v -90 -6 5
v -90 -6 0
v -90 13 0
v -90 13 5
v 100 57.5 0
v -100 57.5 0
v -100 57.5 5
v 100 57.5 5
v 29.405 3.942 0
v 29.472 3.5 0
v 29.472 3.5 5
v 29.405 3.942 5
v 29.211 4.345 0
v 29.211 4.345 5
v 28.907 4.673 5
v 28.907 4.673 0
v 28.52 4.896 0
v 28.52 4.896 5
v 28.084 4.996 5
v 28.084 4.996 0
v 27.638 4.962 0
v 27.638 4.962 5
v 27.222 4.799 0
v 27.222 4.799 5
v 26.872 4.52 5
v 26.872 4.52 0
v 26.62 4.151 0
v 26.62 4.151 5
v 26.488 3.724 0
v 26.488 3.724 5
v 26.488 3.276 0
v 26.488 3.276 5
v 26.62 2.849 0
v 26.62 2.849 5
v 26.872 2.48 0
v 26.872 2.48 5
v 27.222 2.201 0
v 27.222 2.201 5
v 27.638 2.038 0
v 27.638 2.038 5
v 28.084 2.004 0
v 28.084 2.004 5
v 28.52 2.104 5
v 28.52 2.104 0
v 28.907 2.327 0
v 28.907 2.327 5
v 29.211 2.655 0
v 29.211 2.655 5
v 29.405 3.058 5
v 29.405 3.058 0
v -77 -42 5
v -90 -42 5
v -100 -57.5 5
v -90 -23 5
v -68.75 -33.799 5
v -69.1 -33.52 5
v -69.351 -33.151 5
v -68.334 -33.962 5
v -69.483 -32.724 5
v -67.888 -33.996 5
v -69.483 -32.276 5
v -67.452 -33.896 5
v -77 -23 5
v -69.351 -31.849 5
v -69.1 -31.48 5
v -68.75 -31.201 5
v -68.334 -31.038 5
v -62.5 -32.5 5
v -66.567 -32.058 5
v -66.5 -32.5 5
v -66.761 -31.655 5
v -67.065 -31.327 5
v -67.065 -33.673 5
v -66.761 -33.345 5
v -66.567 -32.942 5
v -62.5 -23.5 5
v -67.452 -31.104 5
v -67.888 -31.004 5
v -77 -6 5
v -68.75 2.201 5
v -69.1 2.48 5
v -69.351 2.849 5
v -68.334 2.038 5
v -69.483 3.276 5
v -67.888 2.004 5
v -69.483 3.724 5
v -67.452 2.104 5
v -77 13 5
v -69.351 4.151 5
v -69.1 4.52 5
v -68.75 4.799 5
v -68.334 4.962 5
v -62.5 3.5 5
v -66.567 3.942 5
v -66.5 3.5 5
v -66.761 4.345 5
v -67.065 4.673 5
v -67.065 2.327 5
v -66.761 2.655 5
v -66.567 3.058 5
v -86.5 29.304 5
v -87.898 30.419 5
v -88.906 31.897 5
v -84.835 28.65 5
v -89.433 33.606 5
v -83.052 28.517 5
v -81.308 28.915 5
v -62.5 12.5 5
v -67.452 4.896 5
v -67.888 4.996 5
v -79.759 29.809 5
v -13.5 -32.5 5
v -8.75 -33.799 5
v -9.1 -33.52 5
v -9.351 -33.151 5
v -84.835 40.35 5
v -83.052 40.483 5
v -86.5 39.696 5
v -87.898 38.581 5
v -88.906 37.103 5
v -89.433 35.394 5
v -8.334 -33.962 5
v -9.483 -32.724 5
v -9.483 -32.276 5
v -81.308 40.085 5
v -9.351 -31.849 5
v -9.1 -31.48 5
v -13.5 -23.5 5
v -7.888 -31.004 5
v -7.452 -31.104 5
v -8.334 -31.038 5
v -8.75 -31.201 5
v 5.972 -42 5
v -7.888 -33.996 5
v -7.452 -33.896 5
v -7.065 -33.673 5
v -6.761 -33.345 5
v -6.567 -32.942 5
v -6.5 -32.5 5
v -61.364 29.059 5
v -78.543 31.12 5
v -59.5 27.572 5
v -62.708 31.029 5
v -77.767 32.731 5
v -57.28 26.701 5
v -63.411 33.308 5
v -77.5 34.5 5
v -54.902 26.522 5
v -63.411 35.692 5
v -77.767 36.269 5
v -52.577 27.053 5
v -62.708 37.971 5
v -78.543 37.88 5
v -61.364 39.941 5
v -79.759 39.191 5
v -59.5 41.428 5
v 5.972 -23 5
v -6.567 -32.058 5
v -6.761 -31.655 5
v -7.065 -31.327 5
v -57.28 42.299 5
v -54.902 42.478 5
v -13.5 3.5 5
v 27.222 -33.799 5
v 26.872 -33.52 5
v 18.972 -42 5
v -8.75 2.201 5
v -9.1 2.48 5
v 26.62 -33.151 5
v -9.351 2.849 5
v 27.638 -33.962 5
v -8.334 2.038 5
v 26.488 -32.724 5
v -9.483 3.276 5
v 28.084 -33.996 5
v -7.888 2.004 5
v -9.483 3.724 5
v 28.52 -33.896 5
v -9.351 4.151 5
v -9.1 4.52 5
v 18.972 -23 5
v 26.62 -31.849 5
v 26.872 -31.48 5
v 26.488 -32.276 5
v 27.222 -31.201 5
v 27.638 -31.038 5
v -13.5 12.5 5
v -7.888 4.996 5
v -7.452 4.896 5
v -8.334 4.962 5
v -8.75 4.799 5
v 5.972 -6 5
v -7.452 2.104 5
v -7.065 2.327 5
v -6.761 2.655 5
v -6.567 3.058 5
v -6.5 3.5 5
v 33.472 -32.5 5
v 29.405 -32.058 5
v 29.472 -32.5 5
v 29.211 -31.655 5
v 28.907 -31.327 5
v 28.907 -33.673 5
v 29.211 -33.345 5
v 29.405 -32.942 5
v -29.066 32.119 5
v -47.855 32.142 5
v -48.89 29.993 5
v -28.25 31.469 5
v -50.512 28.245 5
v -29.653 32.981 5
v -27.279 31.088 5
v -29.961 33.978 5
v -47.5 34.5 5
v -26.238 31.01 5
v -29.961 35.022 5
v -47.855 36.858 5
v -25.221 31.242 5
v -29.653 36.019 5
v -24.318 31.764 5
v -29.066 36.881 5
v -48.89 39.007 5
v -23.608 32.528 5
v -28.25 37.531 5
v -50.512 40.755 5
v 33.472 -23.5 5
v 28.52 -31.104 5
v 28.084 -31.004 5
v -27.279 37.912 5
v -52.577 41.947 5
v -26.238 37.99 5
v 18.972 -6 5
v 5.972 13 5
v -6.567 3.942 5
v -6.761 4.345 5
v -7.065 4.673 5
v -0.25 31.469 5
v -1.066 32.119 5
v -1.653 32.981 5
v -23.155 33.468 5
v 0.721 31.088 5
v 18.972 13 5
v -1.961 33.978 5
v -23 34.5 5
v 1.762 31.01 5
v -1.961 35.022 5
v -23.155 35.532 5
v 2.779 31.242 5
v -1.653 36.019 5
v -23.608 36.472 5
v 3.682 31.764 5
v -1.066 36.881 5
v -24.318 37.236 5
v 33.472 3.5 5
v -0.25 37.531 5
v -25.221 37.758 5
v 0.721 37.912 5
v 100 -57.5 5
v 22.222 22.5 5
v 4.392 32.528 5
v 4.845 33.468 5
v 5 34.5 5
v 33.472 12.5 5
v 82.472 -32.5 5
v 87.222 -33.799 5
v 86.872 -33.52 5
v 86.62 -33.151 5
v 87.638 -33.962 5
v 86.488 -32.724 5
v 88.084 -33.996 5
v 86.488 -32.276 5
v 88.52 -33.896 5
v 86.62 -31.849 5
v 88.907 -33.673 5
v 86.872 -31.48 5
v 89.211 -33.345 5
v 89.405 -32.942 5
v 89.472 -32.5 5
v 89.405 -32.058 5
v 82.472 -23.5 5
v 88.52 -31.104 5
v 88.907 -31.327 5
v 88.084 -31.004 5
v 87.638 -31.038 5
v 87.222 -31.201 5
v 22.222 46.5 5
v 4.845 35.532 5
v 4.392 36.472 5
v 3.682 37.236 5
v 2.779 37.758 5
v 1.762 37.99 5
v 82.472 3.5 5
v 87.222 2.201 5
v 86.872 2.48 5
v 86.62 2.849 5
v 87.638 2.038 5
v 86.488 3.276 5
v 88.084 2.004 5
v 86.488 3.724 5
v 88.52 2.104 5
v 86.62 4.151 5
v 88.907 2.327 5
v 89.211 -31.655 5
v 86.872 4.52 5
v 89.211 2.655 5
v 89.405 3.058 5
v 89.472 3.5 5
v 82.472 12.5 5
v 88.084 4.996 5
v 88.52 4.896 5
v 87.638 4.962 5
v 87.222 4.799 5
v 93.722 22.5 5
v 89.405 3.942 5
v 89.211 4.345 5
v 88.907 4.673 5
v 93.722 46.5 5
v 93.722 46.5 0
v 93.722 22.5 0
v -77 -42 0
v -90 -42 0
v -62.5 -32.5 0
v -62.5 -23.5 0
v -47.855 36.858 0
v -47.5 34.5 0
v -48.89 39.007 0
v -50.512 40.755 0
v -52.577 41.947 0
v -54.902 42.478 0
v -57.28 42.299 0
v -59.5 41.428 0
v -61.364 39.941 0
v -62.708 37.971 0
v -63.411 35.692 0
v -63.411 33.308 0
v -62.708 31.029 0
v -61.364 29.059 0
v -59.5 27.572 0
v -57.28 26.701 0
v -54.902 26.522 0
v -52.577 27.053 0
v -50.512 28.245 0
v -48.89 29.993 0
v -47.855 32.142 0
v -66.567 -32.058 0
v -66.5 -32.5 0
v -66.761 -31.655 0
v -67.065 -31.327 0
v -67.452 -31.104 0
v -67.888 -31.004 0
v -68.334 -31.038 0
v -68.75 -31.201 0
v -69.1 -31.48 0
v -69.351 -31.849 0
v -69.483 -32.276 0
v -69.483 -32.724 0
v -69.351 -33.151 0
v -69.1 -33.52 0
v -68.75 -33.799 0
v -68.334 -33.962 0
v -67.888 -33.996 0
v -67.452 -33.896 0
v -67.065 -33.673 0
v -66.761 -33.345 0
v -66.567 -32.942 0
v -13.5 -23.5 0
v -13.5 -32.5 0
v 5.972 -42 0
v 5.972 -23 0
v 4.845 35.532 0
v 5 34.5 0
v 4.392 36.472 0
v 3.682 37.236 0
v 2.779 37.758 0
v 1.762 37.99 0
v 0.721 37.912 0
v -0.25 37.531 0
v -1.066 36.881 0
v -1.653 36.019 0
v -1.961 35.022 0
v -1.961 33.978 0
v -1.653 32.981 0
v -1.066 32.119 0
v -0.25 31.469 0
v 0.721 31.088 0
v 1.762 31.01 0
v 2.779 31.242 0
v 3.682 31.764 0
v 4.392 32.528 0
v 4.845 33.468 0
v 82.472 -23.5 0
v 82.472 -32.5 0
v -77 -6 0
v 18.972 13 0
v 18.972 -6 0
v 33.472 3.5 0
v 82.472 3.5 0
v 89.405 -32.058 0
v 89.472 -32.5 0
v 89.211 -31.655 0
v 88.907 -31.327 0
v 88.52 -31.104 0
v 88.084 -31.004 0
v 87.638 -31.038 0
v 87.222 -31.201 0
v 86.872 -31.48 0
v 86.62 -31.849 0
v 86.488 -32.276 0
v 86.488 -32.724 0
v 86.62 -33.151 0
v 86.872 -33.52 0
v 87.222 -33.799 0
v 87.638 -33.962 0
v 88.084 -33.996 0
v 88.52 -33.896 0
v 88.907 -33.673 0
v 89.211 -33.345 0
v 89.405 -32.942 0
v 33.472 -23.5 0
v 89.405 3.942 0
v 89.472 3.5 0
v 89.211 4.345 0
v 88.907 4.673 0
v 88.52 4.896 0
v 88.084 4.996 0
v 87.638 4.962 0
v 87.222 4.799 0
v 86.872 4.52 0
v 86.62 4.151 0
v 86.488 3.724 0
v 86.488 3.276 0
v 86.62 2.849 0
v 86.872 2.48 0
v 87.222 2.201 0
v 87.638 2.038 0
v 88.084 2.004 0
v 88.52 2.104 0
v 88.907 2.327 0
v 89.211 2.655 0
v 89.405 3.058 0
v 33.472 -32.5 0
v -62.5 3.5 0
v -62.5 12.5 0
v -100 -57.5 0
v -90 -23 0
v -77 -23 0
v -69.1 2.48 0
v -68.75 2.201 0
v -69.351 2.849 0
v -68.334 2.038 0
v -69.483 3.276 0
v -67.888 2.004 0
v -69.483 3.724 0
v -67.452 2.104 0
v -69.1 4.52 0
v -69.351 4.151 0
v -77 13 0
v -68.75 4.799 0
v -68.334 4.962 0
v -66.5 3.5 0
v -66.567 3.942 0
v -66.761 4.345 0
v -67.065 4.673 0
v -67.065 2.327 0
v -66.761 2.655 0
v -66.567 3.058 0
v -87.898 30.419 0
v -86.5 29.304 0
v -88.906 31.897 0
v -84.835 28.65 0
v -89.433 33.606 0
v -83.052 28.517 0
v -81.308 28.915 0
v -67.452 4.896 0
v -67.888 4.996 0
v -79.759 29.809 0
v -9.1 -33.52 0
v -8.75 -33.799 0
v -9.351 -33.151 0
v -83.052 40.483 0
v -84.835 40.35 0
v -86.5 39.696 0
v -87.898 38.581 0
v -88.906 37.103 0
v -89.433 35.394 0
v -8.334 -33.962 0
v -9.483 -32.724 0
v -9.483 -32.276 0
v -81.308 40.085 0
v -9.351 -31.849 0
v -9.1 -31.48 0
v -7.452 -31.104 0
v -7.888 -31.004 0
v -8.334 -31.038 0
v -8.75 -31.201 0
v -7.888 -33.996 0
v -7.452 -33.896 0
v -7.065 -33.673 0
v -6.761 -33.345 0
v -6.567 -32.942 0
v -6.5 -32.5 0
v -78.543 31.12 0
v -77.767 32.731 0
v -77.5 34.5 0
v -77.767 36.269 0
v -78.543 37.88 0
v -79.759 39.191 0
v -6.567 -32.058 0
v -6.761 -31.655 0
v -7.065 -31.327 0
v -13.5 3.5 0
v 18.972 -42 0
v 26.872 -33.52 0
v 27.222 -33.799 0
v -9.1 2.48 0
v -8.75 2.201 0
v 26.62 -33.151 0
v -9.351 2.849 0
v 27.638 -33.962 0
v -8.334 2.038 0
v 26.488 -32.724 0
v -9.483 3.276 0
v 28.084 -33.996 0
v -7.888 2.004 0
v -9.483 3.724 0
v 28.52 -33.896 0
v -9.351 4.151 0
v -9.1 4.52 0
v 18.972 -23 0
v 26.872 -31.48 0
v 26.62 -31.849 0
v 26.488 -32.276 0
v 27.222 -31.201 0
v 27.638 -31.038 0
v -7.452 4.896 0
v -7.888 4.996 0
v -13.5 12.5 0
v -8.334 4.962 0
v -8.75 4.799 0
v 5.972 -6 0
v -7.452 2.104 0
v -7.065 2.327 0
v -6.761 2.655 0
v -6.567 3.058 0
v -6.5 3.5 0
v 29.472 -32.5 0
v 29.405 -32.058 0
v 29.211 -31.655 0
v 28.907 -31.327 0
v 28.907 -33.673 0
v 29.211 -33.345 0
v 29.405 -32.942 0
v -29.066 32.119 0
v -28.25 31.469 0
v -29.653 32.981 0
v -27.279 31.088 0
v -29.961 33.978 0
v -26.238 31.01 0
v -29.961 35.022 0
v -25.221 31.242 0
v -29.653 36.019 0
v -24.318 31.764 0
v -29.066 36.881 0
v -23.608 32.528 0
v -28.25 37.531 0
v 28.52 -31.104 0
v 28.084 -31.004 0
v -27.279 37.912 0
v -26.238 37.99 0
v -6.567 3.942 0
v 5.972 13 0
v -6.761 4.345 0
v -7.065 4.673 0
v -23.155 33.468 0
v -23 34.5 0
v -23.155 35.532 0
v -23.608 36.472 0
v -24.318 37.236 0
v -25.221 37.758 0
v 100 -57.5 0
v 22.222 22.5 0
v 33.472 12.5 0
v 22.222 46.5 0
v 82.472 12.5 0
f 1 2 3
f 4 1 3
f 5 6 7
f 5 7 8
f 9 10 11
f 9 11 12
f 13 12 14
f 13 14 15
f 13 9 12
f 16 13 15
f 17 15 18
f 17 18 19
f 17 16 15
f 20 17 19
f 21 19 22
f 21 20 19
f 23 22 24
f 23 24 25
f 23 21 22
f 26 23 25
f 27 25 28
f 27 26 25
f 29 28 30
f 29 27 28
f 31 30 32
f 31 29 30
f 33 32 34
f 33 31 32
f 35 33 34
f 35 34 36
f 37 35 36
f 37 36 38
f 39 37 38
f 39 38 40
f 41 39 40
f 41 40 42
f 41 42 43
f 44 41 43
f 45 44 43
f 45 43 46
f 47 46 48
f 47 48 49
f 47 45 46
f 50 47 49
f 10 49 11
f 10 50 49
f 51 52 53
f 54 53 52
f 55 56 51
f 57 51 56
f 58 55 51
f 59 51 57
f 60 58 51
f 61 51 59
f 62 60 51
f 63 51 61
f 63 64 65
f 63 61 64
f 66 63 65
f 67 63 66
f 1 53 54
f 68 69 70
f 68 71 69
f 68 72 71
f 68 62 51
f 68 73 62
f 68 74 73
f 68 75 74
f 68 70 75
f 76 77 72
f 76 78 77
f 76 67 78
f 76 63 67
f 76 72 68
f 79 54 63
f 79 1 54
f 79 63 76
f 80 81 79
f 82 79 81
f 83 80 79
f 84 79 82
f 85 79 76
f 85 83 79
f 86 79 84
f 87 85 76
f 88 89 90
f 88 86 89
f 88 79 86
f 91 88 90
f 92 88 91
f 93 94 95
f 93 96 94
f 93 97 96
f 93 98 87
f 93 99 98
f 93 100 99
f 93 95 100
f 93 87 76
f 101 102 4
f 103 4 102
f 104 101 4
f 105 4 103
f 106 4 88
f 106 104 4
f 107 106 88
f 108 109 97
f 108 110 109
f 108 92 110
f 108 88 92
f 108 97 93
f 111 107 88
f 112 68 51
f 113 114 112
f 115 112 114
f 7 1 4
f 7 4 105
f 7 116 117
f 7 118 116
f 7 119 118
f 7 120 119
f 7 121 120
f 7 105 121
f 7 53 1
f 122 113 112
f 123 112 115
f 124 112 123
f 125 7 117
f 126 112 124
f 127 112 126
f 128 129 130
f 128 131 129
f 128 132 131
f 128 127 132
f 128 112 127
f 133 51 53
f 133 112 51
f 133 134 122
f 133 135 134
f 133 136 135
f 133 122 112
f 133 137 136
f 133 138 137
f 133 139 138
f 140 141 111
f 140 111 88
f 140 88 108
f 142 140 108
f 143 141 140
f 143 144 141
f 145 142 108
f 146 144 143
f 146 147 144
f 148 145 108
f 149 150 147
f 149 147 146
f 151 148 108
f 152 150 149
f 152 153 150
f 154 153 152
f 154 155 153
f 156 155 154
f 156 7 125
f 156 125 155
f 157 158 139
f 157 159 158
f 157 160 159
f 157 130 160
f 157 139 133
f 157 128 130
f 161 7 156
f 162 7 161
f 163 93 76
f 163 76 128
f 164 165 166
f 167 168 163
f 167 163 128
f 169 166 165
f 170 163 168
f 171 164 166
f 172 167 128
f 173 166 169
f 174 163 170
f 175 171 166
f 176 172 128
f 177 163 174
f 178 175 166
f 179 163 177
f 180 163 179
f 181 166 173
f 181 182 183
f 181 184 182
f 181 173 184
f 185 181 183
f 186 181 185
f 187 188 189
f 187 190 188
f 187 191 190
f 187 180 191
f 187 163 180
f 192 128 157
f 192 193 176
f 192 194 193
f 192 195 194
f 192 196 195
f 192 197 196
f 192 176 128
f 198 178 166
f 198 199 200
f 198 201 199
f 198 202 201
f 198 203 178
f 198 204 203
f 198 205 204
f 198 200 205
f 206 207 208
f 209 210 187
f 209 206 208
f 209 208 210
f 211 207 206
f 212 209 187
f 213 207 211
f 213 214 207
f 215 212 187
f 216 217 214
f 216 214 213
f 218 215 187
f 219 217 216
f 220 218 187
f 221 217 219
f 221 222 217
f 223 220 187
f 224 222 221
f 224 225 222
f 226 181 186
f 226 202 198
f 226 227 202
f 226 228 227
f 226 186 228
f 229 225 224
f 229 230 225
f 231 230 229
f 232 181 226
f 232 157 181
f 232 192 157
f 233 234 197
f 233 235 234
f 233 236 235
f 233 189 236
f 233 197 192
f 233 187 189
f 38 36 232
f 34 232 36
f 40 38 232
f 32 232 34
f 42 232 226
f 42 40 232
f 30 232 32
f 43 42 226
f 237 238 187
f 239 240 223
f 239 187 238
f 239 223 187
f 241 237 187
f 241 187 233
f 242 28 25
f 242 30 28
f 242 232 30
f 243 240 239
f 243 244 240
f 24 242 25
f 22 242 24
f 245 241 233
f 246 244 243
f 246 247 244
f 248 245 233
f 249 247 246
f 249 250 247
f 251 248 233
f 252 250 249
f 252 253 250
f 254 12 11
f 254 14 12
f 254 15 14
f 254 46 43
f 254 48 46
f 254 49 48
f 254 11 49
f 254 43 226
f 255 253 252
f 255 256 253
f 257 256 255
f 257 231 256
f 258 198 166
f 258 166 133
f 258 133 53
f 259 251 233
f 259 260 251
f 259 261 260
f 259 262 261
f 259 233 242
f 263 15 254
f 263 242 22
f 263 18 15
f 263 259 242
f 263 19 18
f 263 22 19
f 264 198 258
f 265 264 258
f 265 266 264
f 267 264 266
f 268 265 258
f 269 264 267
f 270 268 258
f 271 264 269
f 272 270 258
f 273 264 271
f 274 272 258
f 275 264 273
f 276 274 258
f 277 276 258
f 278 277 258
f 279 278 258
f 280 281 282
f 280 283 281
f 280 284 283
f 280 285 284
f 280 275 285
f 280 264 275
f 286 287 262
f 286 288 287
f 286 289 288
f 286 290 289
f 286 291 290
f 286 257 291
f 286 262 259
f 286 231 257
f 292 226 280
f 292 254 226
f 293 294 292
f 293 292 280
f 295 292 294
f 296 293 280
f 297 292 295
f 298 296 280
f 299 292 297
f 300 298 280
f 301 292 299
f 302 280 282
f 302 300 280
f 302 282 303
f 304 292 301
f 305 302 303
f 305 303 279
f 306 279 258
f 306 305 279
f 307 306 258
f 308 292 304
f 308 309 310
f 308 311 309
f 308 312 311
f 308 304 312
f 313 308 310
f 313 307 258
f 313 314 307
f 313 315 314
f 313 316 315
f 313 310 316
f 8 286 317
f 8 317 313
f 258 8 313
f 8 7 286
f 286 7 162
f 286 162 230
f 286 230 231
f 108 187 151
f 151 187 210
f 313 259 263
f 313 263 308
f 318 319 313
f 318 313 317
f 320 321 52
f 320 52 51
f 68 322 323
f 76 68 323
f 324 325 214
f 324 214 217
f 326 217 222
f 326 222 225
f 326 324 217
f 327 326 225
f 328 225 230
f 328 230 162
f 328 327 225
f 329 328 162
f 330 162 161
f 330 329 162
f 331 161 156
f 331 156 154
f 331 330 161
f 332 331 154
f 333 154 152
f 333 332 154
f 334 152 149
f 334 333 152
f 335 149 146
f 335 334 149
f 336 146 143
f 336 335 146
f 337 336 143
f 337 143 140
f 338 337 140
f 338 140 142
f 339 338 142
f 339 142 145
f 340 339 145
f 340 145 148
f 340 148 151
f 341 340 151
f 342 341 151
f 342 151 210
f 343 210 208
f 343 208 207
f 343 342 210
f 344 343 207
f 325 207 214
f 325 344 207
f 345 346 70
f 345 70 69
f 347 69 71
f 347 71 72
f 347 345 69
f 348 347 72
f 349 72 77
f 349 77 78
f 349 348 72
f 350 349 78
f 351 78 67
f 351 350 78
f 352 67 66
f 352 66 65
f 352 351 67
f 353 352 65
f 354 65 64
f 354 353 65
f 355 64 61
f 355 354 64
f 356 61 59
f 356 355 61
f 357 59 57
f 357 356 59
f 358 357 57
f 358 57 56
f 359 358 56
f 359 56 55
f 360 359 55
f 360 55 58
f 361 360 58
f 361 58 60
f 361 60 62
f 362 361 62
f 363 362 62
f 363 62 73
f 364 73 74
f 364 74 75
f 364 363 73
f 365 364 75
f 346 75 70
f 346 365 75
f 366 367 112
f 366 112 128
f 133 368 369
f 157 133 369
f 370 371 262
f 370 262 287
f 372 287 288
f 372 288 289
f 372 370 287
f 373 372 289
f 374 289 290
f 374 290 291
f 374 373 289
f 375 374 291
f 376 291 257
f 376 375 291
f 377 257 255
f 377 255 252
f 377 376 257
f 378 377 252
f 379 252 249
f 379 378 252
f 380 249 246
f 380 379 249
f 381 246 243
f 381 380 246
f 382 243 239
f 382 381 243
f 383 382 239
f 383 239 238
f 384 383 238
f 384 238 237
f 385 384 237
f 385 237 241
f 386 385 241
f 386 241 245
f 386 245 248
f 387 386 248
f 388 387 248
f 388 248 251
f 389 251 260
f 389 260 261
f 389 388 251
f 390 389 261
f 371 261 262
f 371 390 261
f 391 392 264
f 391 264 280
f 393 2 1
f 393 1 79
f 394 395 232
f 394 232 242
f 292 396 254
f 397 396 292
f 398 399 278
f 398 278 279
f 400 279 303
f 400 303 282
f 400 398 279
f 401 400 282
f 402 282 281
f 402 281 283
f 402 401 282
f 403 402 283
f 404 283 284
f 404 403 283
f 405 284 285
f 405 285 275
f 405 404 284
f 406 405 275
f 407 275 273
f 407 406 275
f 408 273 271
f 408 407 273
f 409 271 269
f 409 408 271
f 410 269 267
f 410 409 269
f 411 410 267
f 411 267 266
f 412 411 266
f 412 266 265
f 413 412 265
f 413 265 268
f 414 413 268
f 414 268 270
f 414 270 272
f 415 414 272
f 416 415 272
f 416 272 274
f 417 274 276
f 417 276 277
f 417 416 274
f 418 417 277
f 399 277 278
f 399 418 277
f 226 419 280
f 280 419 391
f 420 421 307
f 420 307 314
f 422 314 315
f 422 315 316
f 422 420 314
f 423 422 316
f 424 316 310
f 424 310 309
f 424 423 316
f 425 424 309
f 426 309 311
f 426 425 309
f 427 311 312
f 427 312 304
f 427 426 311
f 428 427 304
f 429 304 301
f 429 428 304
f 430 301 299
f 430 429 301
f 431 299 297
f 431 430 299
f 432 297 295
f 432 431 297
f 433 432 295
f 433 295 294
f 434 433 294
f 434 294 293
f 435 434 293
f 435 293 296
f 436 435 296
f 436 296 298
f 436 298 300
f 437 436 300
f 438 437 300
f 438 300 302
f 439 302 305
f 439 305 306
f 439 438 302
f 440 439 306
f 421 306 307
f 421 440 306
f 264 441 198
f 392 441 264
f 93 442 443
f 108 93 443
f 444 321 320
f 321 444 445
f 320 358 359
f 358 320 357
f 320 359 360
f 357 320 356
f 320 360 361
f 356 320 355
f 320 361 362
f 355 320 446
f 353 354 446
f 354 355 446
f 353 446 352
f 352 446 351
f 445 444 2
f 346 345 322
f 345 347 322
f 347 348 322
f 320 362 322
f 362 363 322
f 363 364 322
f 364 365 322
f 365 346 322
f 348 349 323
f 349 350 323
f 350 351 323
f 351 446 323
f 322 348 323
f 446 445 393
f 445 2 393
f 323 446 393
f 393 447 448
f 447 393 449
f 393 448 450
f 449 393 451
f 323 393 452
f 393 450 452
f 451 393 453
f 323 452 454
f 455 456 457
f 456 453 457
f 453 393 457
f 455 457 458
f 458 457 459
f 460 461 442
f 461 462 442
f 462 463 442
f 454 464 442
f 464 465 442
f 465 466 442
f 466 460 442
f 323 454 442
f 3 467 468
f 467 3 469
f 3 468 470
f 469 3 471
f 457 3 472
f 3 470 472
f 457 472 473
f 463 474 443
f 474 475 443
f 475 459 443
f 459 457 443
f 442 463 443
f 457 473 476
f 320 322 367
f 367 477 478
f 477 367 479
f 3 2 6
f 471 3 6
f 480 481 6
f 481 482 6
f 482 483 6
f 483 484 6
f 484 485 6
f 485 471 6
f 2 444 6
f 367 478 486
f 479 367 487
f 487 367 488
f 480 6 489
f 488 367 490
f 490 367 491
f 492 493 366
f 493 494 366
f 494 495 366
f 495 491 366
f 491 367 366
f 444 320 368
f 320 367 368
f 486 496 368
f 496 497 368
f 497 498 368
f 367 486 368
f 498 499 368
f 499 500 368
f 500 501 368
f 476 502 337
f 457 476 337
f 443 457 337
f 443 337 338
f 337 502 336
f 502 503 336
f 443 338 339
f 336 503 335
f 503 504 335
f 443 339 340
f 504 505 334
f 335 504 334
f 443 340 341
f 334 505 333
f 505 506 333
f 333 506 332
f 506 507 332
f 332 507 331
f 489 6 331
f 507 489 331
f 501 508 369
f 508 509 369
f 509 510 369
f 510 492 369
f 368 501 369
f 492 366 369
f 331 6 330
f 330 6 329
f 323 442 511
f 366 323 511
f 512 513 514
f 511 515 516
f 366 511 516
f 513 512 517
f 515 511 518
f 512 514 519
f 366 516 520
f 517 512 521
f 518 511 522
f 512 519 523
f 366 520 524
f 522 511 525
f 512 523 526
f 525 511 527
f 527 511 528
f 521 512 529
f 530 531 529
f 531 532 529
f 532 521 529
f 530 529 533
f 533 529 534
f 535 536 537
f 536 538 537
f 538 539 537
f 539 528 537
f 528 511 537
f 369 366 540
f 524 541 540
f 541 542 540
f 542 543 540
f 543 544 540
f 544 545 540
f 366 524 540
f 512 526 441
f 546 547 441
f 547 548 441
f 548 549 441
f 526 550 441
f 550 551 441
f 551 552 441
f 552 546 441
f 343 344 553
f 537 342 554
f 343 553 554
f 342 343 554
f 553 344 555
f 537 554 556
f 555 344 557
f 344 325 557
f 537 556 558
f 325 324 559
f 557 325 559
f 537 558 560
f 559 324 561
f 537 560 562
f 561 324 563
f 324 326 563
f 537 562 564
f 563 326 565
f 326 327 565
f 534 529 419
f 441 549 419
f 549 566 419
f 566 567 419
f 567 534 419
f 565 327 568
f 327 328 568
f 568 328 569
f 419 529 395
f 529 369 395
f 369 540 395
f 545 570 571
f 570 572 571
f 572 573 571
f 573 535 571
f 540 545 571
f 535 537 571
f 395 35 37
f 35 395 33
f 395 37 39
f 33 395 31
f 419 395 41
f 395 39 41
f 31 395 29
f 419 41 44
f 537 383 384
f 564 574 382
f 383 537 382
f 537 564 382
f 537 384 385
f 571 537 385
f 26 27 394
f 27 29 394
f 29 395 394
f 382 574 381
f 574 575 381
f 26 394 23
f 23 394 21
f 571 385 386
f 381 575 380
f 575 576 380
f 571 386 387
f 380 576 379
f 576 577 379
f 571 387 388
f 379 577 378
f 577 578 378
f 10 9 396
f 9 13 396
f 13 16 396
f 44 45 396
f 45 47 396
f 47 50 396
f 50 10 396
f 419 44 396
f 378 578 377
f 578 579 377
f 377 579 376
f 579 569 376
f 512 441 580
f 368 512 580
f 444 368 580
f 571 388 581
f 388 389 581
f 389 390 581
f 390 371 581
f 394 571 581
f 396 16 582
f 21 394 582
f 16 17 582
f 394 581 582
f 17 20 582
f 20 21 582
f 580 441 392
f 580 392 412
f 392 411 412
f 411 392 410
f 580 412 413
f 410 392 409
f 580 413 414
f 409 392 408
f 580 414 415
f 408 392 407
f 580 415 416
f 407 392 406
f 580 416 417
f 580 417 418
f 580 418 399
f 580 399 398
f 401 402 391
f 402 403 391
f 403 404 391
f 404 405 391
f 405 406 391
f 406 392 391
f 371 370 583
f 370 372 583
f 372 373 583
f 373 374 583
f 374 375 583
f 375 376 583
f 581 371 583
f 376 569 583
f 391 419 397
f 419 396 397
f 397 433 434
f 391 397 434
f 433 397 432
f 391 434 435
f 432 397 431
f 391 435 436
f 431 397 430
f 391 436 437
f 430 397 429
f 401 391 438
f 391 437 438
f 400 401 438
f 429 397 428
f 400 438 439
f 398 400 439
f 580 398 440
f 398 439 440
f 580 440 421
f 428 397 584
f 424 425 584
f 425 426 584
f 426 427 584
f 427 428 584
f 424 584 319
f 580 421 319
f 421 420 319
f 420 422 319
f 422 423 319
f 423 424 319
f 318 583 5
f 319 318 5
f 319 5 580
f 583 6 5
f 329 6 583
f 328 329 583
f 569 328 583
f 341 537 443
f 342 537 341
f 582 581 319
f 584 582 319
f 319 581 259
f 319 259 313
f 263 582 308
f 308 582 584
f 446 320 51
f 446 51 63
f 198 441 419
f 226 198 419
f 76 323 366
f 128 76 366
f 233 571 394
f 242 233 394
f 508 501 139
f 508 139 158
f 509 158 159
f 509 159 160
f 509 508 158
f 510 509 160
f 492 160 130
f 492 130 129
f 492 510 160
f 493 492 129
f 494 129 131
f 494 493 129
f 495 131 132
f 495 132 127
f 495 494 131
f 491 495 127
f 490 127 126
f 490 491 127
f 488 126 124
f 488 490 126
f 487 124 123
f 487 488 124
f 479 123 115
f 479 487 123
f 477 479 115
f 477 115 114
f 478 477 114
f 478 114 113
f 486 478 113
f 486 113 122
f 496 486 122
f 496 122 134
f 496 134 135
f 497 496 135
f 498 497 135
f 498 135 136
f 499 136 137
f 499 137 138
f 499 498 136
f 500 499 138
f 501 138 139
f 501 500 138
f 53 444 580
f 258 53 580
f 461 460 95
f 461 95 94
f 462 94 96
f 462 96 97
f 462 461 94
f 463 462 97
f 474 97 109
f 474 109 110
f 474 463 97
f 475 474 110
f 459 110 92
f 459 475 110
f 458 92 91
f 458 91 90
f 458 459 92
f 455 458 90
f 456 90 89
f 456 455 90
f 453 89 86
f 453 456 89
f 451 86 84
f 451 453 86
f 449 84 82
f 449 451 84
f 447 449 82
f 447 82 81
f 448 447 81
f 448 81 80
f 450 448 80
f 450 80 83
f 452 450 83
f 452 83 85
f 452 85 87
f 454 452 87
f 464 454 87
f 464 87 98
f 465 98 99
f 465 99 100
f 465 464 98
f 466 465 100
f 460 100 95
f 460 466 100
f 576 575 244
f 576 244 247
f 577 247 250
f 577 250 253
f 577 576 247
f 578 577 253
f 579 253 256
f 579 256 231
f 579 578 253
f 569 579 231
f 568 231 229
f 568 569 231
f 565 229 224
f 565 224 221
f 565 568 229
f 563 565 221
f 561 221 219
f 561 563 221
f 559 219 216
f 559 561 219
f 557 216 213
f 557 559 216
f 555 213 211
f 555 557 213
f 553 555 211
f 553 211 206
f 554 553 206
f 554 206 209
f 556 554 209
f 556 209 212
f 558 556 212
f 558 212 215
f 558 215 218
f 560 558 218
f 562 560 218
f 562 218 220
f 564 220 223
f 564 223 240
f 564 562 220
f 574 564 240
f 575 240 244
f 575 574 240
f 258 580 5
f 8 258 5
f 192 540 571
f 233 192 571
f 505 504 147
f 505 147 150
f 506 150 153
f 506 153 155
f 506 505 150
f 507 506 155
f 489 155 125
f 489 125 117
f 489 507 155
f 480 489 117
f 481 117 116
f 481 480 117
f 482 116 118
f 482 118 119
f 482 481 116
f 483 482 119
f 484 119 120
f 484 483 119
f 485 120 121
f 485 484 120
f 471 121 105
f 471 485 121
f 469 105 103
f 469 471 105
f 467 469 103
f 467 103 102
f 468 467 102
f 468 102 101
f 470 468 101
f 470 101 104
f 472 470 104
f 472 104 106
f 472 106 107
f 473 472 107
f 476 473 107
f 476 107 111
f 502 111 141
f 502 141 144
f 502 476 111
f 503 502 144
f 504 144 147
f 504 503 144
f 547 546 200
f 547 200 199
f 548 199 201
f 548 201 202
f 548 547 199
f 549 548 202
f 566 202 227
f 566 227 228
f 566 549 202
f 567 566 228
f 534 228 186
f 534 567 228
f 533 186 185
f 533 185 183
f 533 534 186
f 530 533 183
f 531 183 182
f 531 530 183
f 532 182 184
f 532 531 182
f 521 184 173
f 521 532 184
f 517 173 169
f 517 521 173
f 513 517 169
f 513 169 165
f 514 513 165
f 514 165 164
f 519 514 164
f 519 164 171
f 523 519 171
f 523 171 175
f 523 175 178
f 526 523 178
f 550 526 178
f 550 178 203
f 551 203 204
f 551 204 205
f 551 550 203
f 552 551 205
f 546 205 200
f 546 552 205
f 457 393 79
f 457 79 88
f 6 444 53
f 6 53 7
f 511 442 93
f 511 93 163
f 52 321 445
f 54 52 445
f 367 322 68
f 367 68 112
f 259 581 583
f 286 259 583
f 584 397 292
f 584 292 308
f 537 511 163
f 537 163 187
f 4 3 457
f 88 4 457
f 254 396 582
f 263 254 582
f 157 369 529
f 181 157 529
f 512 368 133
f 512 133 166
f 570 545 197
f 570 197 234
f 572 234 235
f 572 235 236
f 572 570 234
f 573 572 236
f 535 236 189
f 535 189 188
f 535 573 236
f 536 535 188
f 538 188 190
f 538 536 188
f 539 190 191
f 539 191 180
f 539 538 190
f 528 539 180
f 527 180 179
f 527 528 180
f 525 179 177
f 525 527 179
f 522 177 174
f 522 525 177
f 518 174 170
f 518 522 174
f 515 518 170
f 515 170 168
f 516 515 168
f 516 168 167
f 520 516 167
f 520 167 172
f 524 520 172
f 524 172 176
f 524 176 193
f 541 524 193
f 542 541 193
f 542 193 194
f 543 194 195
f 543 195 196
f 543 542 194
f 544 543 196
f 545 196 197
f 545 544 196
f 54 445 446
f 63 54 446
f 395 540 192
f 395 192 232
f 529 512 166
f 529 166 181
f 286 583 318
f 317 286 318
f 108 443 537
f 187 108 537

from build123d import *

# Parameters (mm, degrees)
SKETCH1_W           = 200
SKETCH1_H           = 115
SKETCH1_R           = 1.5
SKETCH1_R_2         = 6
SKETCH1_R_3         = 8
SKETCH1_R_4         = 3.5
SKETCH1_W_2         = 49
SKETCH1_H_2         = 9
SKETCH1_W_3         = 13
SKETCH1_H_3         = 19
SKETCH1_W_4         = 71.5
SKETCH1_H_4         = 24
BOSS_EXTRUDE1_DEPTH = 5


with BuildPart() as part:
    # Sketch1 → Boss-Extrude1 (new body)
    with BuildSketch(Plane.XY):
        Rectangle(SKETCH1_W, SKETCH1_H)
        with Locations((-68, -32.5)):
            Circle(SKETCH1_R, mode=Mode.SUBTRACT)
        with Locations((-8, -32.5)):
            Circle(SKETCH1_R, mode=Mode.SUBTRACT)
        with Locations((87.971622358, -32.5)):
            Circle(SKETCH1_R, mode=Mode.SUBTRACT)
        with Locations((27.971622358, -32.5)):
            Circle(SKETCH1_R, mode=Mode.SUBTRACT)
        with Locations((87.971622358, 3.5)):
            Circle(SKETCH1_R, mode=Mode.SUBTRACT)
        with Locations((27.971622358, 3.5)):
            Circle(SKETCH1_R, mode=Mode.SUBTRACT)
        with Locations((-8, 3.5)):
            Circle(SKETCH1_R, mode=Mode.SUBTRACT)
        with Locations((-68, 3.5)):
            Circle(SKETCH1_R, mode=Mode.SUBTRACT)
        with Locations((-83.5, 34.5)):
            Circle(SKETCH1_R_2, mode=Mode.SUBTRACT)
        with Locations((-55.5, 34.5)):
            Circle(SKETCH1_R_3, mode=Mode.SUBTRACT)
        with Locations((1.5, 34.5)):
            Circle(SKETCH1_R_4, mode=Mode.SUBTRACT)
        with Locations((-26.5, 34.5)):
            Circle(SKETCH1_R_4, mode=Mode.SUBTRACT)
        with Locations((-38, -28)):
            Rectangle(SKETCH1_W_2, SKETCH1_H_2, mode=Mode.SUBTRACT)
        with Locations((-83.5, -32.5)):
            Rectangle(SKETCH1_W_3, SKETCH1_H_3, mode=Mode.SUBTRACT)
        with Locations((57.971622358, -28)):
            Rectangle(SKETCH1_W_2, SKETCH1_H_2, mode=Mode.SUBTRACT)
        with Locations((12.471622358, -32.5)):
            Rectangle(SKETCH1_W_3, SKETCH1_H_3, mode=Mode.SUBTRACT)
        with Locations((57.971622358, 8)):
            Rectangle(SKETCH1_W_2, SKETCH1_H_2, mode=Mode.SUBTRACT)
        with Locations((12.471622358, 3.5)):
            Rectangle(SKETCH1_W_3, SKETCH1_H_3, mode=Mode.SUBTRACT)
        with Locations((-38, 8)):
            Rectangle(SKETCH1_W_2, SKETCH1_H_2, mode=Mode.SUBTRACT)
        with Locations((-83.5, 3.5)):
            Rectangle(SKETCH1_W_3, SKETCH1_H_3, mode=Mode.SUBTRACT)
        with Locations((57.971622358, 34.5)):
            Rectangle(SKETCH1_W_4, SKETCH1_H_4, mode=Mode.SUBTRACT)
    extrude(amount=BOSS_EXTRUDE1_DEPTH)


solid = part.part
